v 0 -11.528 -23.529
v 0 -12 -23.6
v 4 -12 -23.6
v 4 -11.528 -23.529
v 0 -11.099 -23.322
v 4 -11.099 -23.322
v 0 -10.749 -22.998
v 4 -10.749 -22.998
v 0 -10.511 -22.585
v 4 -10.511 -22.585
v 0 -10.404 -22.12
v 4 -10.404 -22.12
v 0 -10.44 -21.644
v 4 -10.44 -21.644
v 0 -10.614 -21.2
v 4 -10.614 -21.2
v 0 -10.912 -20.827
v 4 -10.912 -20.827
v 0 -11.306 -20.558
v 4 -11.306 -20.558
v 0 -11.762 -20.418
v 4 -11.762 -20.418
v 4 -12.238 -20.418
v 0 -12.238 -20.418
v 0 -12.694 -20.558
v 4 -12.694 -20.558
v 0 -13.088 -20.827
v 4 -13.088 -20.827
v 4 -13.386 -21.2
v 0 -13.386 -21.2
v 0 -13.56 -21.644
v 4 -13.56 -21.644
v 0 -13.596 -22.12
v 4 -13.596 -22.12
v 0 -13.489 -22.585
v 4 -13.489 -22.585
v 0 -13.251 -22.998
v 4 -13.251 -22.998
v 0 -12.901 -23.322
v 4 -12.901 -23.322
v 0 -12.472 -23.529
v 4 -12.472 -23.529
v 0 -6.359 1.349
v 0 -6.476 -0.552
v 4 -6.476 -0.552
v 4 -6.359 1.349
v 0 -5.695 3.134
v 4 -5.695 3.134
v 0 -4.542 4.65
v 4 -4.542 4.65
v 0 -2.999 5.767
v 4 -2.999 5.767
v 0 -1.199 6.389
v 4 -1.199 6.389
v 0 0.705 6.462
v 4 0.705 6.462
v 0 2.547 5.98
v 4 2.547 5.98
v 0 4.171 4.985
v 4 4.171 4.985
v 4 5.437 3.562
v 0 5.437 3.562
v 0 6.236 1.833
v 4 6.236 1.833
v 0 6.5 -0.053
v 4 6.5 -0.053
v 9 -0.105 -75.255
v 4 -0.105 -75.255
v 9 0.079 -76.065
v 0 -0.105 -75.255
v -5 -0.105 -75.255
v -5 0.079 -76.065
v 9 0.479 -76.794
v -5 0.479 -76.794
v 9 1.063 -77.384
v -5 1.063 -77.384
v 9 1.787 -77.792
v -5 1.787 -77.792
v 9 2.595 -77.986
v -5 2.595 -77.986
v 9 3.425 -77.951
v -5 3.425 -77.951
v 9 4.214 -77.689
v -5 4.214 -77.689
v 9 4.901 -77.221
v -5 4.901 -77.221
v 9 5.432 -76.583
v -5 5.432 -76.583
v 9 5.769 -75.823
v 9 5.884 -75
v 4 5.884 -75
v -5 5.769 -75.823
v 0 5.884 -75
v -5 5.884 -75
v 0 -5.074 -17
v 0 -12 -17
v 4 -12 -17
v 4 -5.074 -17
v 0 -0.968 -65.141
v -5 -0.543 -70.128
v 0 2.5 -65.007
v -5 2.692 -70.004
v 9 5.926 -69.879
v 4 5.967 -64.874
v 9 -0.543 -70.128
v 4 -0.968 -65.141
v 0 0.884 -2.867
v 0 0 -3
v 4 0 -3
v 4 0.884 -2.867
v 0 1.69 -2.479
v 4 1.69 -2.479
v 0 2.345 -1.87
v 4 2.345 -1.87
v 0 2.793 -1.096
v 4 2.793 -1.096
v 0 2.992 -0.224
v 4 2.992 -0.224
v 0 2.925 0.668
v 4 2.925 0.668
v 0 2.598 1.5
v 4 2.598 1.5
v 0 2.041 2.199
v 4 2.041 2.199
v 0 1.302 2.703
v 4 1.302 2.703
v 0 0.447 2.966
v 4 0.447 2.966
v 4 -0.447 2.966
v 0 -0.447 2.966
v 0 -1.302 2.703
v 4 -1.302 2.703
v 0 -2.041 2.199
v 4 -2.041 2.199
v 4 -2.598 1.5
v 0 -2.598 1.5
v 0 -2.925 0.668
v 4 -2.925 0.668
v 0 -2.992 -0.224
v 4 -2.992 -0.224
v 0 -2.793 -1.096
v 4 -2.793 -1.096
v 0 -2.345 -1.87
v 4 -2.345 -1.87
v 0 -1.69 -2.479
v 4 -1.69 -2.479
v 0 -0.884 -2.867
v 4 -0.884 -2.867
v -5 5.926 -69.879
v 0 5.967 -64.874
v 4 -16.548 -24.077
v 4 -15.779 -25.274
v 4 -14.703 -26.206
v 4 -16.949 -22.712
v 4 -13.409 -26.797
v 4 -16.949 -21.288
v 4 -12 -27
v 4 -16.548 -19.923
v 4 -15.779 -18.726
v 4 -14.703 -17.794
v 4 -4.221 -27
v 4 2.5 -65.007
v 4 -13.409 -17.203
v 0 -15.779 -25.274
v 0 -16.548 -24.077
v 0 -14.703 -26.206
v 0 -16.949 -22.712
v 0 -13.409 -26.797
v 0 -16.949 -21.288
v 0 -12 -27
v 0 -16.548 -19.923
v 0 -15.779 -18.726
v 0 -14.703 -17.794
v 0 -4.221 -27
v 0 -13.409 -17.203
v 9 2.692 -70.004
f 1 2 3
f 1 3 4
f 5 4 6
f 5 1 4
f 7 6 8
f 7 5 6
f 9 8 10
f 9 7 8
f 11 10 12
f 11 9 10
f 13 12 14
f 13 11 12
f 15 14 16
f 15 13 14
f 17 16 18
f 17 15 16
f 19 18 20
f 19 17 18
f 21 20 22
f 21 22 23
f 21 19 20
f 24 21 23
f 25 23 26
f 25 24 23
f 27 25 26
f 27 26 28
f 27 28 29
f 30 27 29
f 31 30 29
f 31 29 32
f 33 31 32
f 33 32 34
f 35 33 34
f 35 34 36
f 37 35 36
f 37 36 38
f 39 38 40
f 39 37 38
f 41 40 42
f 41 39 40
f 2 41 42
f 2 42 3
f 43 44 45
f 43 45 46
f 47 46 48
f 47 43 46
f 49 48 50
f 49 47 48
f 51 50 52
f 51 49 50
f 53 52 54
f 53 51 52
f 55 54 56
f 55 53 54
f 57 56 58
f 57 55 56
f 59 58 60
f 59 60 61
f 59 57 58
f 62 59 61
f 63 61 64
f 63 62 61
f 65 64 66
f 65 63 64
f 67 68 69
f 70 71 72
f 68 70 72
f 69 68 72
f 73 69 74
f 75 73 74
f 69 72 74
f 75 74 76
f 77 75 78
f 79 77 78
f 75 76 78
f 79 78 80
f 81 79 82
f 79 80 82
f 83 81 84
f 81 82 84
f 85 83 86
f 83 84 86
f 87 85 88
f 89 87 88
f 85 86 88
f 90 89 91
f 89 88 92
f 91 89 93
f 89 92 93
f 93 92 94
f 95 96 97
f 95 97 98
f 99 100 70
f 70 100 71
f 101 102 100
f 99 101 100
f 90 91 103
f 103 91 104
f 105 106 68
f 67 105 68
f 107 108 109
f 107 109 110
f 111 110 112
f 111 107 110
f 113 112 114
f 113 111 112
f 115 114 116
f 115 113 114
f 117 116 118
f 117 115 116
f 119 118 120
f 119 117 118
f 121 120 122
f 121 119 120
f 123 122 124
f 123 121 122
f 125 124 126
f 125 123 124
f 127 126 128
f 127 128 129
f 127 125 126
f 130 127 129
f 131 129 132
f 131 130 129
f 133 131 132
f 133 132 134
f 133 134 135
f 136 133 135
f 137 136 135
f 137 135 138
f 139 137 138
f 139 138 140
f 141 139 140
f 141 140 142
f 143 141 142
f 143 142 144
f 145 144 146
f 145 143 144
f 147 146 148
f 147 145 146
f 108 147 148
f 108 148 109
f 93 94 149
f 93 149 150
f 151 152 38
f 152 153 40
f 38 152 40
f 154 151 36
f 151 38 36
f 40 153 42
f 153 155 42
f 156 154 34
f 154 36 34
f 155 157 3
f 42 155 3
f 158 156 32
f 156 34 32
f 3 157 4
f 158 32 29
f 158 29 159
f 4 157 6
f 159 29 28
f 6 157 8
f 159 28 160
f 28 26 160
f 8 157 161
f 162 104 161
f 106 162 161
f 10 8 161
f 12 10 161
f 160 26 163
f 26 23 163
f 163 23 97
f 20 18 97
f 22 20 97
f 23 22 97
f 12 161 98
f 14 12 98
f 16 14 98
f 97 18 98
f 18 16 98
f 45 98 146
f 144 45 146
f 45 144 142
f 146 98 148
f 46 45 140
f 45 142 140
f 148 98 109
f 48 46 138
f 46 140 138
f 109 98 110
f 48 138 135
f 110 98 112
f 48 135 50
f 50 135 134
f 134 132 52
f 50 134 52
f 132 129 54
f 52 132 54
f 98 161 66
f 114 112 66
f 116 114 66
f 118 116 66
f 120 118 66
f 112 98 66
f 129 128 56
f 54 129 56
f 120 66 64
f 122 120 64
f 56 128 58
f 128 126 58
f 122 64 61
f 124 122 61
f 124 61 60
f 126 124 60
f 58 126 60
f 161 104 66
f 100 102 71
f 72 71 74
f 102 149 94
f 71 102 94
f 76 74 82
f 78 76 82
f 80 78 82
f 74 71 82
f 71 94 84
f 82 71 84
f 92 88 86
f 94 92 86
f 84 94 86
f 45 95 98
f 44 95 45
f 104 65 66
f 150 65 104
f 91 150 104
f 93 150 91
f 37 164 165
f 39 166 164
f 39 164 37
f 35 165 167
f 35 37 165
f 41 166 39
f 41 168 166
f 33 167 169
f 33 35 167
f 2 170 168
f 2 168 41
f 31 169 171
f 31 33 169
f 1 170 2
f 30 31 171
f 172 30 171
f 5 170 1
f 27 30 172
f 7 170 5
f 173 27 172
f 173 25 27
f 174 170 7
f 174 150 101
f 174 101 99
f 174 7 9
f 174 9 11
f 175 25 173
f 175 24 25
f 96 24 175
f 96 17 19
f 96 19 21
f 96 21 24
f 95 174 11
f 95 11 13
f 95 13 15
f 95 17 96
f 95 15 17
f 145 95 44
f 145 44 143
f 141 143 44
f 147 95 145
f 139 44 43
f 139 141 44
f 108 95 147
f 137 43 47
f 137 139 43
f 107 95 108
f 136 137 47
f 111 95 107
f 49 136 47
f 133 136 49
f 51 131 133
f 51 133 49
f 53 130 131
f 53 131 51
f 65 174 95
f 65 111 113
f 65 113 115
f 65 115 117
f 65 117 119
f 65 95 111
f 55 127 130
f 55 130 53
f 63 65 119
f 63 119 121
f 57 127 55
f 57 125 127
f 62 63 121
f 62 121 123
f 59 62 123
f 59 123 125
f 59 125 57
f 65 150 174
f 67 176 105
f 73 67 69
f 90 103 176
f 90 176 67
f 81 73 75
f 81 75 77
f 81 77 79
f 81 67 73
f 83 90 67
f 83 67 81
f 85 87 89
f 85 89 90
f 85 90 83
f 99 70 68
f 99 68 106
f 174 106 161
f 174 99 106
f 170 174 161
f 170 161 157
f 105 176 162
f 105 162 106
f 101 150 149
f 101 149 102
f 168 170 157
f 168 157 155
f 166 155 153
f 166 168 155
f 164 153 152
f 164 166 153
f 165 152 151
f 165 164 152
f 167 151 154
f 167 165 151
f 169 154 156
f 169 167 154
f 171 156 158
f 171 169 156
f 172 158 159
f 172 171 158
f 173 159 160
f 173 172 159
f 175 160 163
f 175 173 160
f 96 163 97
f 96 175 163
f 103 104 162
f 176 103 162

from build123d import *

# Parameters (mm, degrees)
SKETCH1_R                = 1.6
SKETCH1_R_2              = 3
BOSS_EXTRUDE1_DEPTH      = 4
BOSS_EXTRUDE2_DEPTH      = 5
BOSS_EXTRUDE2_DEPTH_BACK = 9
CHAMFER1_SIZE            = 5


with BuildPart() as part:
    # Sketch1 → Boss-Extrude1 (new body)
    with BuildSketch(Plane(origin=(0, 0, 0), x_dir=(0, 0, -1), z_dir=(1, 0, 0))):
        with BuildLine():
            Line((0.053412883, 6.49978054), (75, 5.883896162))
            ThreePointArc((75, 5.883896162), (77.997285796, 3.011480877), (75.25493857, -0.105251932))
            Line((75.25493857, -0.105251932), (27, -4.220820858))
            Line((27, -4.220820858), (27, -12))
            ThreePointArc((27, -12), (22, -17), (17, -12))
            Line((17, -12), (17, -5.073701216))
            Line((17, -5.073701216), (0.552366901, -6.476487536))
            ThreePointArc((0.552366901, -6.476487536), (-6.495200196, -0.249748712), (0.053412883, 6.49978054))
        make_face()
        with Locations((22, -12)):
            Circle(SKETCH1_R, mode=Mode.SUBTRACT)
        Circle(SKETCH1_R_2, mode=Mode.SUBTRACT)
    extrude(amount=BOSS_EXTRUDE1_DEPTH)

    # Sketch2 → Boss-Extrude2 (add, two sides: drawn at the far end of the back side and taken through both)
    with BuildSketch(Plane(origin=(4, 0, 0), x_dir=(0, 0, -1), z_dir=(1, 0, 0)).offset(-BOSS_EXTRUDE2_DEPTH_BACK)):
        with BuildLine():
            Line((70.003692287, 2.691778393), (70.128057116, -0.54251358))
            Line((70.128057116, -0.54251358), (75.25493857, -0.105251932))
            ThreePointArc((75.25493857, -0.105251932), (77.997285796, 3.011480877), (75, 5.883896162))
            Line((75, 5.883896162), (69.879331086, 5.925975997))
            Line((69.879331086, 5.925975997), (70.003692287, 2.691778393))
        make_face()
    extrude(amount=BOSS_EXTRUDE2_DEPTH + BOSS_EXTRUDE2_DEPTH_BACK)

    # Chamfer1
    chamfer1_edges = [part.edges().sort_by_distance(p)[0] for p in [
        (0, 2.691731208, -70.003694101),
        (4, 2.691731208, -70.003694101),
    ]]
    chamfer(chamfer1_edges, length=CHAMFER1_SIZE - 0.0001)  # a hair under: the kernel refuses the full size


solid = part.part
